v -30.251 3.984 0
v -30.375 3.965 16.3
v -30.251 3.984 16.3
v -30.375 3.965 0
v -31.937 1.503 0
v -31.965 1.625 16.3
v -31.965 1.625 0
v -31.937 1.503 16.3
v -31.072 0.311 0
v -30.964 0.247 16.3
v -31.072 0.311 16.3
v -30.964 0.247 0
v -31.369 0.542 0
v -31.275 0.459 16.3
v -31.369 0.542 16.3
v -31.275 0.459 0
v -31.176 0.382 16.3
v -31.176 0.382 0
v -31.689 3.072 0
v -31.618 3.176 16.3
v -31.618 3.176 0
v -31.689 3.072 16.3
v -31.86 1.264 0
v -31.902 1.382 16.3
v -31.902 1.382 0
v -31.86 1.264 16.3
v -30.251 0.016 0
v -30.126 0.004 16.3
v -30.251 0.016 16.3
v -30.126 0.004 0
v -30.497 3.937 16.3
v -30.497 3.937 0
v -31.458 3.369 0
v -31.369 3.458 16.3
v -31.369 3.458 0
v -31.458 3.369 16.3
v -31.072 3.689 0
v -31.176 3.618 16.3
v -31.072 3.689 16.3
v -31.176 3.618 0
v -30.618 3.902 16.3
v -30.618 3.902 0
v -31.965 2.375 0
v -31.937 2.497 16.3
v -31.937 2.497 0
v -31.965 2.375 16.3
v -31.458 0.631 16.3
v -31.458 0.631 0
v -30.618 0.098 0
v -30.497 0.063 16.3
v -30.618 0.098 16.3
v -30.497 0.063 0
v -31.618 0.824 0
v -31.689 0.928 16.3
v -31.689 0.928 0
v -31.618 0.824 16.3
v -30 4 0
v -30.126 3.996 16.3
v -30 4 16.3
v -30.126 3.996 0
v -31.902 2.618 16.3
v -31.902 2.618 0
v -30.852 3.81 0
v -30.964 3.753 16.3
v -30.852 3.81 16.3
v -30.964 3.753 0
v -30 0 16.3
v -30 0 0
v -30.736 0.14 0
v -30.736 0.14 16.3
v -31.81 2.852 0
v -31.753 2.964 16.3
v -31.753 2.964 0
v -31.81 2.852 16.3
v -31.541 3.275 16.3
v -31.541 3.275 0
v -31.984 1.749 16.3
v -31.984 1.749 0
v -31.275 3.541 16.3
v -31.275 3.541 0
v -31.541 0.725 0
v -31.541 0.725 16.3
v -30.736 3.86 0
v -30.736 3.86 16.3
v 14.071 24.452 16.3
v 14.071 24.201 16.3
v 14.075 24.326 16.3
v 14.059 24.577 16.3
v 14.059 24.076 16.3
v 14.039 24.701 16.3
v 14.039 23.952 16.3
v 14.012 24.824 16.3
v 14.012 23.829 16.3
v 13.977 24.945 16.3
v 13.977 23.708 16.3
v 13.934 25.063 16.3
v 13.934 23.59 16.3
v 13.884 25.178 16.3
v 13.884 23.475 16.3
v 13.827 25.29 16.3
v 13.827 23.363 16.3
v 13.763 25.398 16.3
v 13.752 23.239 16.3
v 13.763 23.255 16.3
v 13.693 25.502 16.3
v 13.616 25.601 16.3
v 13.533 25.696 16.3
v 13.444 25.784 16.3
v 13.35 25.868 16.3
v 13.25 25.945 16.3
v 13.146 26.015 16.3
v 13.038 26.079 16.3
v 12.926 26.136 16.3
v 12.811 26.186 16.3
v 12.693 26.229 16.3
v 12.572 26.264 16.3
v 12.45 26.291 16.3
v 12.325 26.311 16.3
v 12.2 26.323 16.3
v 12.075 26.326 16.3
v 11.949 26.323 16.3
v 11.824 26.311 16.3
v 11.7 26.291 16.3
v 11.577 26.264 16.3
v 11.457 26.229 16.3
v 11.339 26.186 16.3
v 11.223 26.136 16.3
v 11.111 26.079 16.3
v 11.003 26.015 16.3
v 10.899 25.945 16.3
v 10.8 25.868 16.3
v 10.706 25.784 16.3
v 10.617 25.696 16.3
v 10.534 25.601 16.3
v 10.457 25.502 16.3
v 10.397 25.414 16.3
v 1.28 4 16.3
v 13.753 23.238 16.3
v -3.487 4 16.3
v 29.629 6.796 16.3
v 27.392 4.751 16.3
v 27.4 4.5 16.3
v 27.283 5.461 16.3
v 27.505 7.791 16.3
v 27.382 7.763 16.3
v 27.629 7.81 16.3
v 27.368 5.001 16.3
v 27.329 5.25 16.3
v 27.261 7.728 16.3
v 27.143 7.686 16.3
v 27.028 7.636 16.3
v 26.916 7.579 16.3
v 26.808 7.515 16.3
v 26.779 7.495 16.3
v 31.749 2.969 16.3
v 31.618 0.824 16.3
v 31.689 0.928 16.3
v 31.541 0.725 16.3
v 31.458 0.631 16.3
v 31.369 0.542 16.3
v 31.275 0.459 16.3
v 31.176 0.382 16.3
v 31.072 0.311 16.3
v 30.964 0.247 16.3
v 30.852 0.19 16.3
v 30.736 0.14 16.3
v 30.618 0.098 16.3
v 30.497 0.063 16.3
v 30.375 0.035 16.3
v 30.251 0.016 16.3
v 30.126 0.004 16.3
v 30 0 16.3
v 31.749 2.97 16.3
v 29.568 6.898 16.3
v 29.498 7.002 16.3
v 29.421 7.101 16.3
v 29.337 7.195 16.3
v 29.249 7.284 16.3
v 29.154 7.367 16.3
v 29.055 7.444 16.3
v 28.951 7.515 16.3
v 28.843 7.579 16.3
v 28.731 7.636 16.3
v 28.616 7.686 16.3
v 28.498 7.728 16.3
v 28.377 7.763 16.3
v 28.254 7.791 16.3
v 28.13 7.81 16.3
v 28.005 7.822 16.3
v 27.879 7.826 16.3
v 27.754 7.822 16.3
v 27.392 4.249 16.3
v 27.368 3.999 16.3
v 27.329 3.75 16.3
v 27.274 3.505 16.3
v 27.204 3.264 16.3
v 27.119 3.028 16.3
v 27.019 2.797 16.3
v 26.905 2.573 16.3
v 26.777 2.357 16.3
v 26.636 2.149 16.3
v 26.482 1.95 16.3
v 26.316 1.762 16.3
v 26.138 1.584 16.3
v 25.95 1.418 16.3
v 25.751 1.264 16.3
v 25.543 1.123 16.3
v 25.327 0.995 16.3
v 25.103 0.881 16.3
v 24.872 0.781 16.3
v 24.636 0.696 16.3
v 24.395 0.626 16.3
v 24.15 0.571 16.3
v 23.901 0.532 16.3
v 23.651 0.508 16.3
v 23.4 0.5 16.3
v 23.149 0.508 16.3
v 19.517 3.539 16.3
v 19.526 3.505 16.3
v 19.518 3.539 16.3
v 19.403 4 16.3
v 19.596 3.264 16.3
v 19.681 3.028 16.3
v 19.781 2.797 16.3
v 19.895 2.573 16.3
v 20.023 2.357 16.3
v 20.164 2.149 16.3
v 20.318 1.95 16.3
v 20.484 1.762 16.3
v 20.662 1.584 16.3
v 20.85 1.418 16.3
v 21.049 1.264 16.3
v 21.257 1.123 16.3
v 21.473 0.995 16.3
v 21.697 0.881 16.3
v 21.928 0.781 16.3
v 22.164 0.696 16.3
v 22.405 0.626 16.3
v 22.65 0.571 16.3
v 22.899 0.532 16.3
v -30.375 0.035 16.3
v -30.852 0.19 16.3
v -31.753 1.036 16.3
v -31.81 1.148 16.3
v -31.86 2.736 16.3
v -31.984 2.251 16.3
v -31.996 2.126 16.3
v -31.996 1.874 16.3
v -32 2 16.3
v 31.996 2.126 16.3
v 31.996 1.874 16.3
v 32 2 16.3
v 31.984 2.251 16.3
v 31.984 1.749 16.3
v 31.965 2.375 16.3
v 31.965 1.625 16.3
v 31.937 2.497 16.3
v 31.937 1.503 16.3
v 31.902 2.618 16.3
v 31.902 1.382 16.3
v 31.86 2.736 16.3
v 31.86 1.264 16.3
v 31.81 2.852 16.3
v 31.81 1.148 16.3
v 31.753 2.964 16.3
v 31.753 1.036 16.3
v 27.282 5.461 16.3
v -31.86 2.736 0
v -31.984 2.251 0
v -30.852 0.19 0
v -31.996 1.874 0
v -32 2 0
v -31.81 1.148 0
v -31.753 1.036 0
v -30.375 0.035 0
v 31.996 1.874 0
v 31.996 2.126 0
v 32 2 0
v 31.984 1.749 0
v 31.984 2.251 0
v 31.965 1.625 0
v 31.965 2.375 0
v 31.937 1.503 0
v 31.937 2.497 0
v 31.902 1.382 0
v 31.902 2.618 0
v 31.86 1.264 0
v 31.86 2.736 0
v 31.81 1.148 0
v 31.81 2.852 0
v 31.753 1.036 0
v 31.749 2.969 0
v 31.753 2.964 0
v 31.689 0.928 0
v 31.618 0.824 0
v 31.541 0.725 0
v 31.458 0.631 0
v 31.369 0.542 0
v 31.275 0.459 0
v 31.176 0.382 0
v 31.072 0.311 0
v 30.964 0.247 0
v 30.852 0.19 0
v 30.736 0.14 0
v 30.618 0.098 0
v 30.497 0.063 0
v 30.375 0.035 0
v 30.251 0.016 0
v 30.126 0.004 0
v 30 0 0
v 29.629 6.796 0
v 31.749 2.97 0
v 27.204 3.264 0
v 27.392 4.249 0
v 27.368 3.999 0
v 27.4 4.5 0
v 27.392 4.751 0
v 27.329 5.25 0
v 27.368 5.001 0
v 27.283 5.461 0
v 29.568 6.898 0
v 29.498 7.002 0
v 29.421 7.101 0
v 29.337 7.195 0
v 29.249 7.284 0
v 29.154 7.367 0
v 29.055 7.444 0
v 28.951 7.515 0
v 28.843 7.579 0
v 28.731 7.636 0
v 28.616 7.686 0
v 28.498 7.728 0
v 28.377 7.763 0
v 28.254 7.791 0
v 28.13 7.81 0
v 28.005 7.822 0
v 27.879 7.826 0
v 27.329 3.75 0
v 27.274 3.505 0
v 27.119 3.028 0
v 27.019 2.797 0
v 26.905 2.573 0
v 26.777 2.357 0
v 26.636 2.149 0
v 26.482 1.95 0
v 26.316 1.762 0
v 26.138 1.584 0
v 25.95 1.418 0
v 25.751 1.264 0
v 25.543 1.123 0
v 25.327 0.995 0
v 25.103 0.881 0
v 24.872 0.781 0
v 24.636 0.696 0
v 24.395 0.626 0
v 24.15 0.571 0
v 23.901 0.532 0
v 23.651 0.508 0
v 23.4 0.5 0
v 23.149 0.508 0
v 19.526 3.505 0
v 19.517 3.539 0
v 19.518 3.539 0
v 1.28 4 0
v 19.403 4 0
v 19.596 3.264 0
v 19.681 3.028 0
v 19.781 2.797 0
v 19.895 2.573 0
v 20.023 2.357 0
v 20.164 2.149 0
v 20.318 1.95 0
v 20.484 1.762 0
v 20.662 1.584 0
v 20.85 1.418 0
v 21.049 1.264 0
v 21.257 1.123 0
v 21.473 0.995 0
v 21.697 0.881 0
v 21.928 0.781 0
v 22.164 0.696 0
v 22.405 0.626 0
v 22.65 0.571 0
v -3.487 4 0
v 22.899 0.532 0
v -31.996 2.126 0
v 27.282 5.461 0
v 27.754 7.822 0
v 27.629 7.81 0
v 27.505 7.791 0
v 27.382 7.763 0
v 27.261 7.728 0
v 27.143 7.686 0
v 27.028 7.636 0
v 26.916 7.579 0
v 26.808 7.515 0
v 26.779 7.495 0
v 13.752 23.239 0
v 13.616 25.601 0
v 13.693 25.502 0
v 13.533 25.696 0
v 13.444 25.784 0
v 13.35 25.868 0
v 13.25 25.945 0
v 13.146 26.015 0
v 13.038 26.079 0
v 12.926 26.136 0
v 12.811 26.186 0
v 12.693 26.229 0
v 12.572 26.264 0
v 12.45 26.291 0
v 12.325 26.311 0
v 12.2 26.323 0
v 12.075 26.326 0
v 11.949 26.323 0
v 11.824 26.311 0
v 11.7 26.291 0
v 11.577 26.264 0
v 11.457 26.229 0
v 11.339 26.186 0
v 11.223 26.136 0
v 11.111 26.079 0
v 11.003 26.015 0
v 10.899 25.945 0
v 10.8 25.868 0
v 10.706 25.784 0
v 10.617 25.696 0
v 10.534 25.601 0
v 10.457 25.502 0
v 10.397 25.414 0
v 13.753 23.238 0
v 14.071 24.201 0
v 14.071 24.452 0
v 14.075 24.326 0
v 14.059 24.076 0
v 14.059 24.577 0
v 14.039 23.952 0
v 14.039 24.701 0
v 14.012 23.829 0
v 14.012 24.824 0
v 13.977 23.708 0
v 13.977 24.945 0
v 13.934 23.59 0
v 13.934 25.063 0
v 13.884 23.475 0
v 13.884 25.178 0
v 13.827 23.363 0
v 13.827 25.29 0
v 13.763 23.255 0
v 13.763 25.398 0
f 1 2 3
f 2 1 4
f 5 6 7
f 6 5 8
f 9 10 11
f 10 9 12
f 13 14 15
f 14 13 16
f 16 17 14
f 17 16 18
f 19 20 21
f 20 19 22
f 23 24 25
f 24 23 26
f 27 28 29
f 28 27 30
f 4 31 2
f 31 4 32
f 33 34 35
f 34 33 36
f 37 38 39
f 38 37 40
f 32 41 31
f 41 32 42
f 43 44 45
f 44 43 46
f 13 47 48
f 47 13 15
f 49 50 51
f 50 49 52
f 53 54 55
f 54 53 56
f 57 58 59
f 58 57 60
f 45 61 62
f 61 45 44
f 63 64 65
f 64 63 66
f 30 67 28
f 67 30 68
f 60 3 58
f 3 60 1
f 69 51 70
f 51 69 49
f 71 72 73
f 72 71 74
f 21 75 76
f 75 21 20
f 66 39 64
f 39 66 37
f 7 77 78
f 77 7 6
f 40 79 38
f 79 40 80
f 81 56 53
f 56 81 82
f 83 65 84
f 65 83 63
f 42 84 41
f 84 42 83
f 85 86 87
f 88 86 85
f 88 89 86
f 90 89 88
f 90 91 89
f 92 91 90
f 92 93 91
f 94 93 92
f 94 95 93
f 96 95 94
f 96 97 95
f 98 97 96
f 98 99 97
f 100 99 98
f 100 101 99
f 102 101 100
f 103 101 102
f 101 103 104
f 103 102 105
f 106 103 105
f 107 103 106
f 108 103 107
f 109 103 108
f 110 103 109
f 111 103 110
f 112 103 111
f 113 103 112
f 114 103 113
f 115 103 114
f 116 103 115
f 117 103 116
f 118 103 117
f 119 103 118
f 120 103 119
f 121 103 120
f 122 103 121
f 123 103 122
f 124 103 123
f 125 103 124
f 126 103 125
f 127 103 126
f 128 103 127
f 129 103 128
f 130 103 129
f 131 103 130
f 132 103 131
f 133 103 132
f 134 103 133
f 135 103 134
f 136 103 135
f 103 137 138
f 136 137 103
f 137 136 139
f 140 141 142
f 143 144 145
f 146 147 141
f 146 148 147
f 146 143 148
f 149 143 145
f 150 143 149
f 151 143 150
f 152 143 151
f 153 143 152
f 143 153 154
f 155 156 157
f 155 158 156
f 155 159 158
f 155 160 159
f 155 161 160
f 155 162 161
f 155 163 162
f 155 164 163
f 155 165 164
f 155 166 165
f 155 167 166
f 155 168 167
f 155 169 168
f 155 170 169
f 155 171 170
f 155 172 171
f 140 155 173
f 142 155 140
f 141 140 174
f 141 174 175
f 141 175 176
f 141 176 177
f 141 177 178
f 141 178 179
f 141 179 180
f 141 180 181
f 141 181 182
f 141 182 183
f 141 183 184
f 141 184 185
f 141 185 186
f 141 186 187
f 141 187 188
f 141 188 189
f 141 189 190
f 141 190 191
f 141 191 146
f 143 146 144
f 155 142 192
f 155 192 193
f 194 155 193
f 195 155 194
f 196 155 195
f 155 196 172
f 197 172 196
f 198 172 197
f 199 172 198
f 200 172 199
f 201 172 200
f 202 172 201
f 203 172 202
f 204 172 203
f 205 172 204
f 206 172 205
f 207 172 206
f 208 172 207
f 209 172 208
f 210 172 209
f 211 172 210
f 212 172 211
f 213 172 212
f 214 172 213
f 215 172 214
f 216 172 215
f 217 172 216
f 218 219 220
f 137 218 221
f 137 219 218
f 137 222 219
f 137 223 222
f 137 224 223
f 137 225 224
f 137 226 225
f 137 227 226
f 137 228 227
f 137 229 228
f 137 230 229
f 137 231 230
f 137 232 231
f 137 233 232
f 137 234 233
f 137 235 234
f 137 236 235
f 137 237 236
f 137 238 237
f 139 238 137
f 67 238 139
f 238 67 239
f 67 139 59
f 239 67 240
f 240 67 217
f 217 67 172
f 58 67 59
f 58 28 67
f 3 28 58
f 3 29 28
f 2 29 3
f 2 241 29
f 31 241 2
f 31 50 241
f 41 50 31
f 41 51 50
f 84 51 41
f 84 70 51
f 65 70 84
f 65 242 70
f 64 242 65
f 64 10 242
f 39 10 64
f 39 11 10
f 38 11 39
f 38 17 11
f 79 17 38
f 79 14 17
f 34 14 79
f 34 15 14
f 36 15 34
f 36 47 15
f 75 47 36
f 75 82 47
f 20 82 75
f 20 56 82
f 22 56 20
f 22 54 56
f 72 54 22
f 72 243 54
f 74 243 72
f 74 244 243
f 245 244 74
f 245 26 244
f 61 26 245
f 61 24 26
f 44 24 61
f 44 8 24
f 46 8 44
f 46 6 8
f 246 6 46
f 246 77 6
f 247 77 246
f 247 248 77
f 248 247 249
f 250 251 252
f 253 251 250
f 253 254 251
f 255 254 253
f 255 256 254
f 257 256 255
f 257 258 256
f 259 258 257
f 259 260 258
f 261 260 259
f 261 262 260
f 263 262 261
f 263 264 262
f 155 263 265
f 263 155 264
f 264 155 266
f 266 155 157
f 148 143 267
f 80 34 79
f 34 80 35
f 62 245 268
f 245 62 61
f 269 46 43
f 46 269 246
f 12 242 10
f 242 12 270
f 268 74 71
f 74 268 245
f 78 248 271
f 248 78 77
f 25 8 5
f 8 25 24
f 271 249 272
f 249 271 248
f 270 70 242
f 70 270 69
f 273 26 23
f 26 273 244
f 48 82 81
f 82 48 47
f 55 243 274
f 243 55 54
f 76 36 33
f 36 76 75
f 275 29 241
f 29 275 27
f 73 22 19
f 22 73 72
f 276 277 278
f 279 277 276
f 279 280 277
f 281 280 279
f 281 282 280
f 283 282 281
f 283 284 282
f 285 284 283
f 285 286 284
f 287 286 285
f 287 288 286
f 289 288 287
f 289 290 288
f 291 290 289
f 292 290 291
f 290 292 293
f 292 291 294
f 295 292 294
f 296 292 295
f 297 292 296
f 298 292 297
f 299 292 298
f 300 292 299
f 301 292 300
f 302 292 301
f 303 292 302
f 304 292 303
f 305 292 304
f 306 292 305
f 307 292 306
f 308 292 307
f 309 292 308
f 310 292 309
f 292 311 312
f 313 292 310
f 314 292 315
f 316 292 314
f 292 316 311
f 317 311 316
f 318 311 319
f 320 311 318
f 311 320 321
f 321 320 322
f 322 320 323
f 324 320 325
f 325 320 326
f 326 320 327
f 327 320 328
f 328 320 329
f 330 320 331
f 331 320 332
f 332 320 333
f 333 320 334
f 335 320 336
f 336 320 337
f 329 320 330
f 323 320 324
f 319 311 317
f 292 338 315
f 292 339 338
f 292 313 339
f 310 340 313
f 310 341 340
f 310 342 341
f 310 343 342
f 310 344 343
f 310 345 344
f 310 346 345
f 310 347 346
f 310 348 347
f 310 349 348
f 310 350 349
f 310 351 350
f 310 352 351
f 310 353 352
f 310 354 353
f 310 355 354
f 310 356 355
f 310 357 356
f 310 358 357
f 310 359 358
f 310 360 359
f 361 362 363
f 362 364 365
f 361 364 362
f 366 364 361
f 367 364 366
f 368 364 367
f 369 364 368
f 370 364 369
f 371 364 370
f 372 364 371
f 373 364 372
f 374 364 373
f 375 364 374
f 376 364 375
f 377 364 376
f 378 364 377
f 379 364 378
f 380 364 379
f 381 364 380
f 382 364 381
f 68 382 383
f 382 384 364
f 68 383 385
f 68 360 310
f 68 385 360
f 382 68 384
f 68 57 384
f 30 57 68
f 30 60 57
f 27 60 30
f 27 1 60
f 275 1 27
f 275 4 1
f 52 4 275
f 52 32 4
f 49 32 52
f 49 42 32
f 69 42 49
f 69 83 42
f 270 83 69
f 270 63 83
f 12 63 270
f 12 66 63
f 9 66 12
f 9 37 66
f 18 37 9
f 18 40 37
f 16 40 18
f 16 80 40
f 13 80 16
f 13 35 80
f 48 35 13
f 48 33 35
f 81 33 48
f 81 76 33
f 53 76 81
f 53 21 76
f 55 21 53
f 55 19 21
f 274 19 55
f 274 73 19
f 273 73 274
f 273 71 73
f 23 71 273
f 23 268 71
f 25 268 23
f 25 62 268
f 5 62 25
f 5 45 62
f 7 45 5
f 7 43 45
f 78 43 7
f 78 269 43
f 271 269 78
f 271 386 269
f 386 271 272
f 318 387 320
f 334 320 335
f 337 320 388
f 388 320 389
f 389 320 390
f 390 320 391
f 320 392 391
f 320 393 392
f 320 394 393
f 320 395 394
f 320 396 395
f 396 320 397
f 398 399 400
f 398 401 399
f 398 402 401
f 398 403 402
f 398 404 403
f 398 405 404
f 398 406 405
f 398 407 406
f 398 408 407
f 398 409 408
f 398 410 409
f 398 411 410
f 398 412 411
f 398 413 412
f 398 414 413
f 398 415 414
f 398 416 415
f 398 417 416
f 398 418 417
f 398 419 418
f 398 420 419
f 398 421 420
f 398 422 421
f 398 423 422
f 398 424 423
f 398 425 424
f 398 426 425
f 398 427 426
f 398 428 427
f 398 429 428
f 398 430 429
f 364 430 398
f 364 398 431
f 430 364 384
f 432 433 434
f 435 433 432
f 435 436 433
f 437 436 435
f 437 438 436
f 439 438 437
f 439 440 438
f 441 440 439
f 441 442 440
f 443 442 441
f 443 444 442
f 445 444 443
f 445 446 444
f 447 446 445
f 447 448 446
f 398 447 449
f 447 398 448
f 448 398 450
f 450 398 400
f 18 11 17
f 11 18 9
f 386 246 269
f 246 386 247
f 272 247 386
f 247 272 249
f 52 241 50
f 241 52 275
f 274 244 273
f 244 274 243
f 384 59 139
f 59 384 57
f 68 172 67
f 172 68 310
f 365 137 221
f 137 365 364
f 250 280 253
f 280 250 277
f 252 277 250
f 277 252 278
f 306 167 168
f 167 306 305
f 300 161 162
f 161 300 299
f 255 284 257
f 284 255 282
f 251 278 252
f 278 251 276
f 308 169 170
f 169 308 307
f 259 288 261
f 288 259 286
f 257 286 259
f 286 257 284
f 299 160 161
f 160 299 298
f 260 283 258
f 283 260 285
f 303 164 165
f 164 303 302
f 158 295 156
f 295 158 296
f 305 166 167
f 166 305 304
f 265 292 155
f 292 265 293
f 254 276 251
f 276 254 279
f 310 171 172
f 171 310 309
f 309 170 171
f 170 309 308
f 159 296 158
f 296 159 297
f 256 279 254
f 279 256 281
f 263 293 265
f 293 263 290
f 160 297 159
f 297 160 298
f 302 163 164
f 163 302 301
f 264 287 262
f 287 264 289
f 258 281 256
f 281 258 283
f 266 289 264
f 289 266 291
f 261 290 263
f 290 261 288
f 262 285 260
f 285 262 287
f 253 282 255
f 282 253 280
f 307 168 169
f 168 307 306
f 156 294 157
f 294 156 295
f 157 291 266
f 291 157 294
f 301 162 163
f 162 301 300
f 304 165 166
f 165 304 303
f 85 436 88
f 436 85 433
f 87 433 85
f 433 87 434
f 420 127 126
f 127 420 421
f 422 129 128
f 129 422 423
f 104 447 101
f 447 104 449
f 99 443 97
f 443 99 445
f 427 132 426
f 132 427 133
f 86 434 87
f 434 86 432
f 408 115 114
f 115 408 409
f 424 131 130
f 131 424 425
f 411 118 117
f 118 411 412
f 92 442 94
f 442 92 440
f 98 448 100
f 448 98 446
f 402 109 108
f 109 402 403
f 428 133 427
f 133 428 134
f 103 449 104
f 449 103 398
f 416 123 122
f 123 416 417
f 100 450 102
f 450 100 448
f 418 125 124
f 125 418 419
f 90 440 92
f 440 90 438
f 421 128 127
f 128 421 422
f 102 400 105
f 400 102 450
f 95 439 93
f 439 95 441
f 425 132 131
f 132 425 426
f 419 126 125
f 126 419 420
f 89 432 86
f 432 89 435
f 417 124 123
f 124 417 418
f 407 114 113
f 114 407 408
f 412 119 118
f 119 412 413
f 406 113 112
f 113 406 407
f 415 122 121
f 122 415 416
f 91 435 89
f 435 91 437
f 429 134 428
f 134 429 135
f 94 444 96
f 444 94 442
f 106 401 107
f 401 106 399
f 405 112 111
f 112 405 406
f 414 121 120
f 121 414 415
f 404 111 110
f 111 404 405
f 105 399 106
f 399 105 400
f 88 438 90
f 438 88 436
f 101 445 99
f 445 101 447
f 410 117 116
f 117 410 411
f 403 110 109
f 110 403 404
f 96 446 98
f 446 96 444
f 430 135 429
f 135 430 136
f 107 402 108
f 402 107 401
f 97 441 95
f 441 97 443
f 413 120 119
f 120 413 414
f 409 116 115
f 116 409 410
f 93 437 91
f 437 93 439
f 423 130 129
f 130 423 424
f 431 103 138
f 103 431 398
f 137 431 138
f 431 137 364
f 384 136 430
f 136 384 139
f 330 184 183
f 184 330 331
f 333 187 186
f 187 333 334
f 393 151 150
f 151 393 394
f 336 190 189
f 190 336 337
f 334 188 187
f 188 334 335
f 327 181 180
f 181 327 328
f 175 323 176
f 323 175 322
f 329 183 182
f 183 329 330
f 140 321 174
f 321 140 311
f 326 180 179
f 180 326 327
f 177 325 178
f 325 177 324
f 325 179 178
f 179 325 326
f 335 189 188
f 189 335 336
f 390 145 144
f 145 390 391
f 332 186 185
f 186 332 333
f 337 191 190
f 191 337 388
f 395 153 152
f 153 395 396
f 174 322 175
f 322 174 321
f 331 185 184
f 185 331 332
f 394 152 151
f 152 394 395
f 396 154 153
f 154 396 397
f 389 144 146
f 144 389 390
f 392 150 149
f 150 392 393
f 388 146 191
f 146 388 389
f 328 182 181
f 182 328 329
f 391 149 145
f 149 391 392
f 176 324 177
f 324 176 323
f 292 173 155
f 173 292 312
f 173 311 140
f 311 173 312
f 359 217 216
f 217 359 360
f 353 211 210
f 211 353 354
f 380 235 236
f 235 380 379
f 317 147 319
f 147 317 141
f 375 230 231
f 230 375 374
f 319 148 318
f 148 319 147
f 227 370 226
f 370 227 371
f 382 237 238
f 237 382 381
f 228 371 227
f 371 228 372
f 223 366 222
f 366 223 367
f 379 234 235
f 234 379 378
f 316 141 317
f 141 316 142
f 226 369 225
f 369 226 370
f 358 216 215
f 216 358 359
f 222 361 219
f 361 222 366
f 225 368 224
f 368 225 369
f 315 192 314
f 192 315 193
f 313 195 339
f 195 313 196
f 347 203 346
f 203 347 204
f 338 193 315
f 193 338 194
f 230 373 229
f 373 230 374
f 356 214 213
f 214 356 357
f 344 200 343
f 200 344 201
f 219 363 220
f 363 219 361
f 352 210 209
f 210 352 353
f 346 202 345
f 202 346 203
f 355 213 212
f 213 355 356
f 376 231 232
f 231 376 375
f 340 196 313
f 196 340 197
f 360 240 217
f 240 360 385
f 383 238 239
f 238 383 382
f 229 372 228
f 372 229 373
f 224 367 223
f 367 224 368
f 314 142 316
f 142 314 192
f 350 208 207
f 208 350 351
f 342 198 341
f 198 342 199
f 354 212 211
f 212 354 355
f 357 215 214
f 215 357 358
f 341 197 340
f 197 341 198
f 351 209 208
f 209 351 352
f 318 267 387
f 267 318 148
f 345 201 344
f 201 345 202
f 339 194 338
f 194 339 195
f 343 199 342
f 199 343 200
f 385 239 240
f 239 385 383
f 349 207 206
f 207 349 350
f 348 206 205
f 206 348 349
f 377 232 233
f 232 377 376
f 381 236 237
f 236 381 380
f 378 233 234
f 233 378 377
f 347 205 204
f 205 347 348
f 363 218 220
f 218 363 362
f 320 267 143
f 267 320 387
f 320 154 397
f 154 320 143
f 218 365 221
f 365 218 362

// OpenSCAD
$fn=100*1;
// Base width (millimeter)
H = 16.3;  //  [4:0.1:100]
// Base length (millimeter)
L = 60; // [30:0.1:90]
// Device thickness (millimeter)
T = 8;  //  [8:0.1:12]
// Device inclination (degree)
A = 103.9;  //  [91:0.1:130]
// Dock thickness (millimeter)
D = 4;  //  [2:0.1:8]
// Backing X (millimeter)
X = 20;  // [0:0.1:30]
// Backing Y (millimeter)
Y = 0;  // [0:0.1:30]
//Y = D/2;  // [0:0.1:30]

module wall(x1,y1,x2,y2,z,t)
{
    dx=x2-x1;
    dy=y2-y1;
    l = sqrt(dx*dx+dy*dy);
    translate([x1,y1,0])cylinder(h=z,r=t/2);
    translate([x2,y2,0])cylinder(h=z,r=t/2);
    translate([x1+dx/2,y1+dy/2,z/2])rotate(atan2(dy,dx),[0,0,1])cube([l,t,z],center=true);
}

difference()
{
    union()
    {
    wall(30-L,D/2,max(24-X-2*T/2.5+Y/tan(A),30-L),Y+D/2,H,D); // base1
    wall(max(24-X-2*T/2.5+Y/tan(A),30-L),Y+D/2,24-2*T/2.5,D/2,H,D); // base2
    wall(24-2*T/2.5,D/2,30,D/2,H,D); // base0
    wall(24-2*T/2.5+23*cos(A),D/2+23*sin(A),max(24-X-2*T/2.5+Y/tan(A),30-L),Y+D/2,H,D); // back    
    wall(30,D/2,6.2*cos(110)+30,6.2*sin(110),H,D); // foot
    
    }
    translate([0,0,-1])wall(26.6-T/2.5,T/2+0.5,26.6-T/2.5+47*cos(A),T/2+0.5+47*sin(A),H+2,T); // base hole        
}
